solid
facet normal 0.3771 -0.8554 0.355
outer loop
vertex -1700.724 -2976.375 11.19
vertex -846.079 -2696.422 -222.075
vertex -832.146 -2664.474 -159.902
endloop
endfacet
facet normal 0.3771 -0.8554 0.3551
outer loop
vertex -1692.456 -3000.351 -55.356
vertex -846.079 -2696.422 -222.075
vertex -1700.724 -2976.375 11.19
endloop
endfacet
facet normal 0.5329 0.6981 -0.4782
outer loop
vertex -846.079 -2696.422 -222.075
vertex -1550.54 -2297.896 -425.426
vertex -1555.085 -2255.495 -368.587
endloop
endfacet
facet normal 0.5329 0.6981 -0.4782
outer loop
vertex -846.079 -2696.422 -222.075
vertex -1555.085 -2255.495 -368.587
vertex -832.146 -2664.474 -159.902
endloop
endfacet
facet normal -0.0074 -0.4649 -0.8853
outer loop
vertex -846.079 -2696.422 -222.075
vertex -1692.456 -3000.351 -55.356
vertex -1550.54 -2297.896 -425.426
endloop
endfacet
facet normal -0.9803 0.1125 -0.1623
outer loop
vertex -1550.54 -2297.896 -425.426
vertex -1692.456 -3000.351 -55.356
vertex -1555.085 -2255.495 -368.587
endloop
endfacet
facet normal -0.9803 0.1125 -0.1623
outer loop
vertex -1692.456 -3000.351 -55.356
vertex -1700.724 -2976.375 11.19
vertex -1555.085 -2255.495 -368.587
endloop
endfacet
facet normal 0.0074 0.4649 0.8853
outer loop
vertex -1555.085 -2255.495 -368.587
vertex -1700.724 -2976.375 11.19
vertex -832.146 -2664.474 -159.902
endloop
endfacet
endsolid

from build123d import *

# Parameters (mm, degrees)
BOSS_EXTRUDE1_DEPTH = 70
CHAMFER1_SIZE2      = 5.656659752
CHAMFER1_SIZE       = 70
CHAMFER2_SIZE2      = 70
CHAMFER2_SIZE       = 6.943744914
CHAMFER3_SIZE2      = 6.666257335
CHAMFER3_SIZE       = 70


with BuildPart() as part:
    # Sketch1 → Boss-Extrude1 (new body)
    with BuildSketch(Plane(origin=(-9.889310543, -592.27380366, -1254.98072345), x_dir=(0.9998495453727724, -0.017332267315879432, 0.0006921904012523395), z_dir=(-0.007446202576901621, -0.46490731349894177, -0.8853280431130489))):
        Polygon((-1515.522491278, 1908.617278557), (-785.459493052, 2356.346592467), (-1648.382414563, 2725.598184499), align=None)
    extrude(amount=BOSS_EXTRUDE1_DEPTH)

    # Chamfer1
    chamfer1_edges = [part.edges().sort_by_distance(p)[0] for p in [
        (-1266.956669693, -2852.967870133, -136.329178409),
    ]]
    chamfer1_side = [part.faces().sort_by_distance(p)[0] for p in [
        (-1266.95582728, -2852.915273683, -136.229018419),
    ]]
    chamfer(chamfer1_edges, length=CHAMFER1_SIZE - 0.0001, length2=CHAMFER1_SIZE2 - 0.0001, reference=chamfer1_side[0])  # a hair under: the kernel refuses the full size

    # Chamfer2
    chamfer2_edges = [part.edges().sort_by_distance(p)[0] for p in [
        (-1627.836641831, -2645.560867546, -242.208403318),
    ]]
    chamfer2_side = [part.faces().sort_by_distance(p)[0] for p in [
        (-1627.699937507, -2645.582975488, -242.197943675),
    ]]
    chamfer(chamfer2_edges, length=CHAMFER2_SIZE - 0.0001, length2=CHAMFER2_SIZE2 - 0.0001, reference=chamfer2_side[0])  # a hair under: the kernel refuses the full size

    # Chamfer3
    chamfer3_edges = [part.edges().sort_by_distance(p)[0] for p in [
        (-1193.89566166, -2492.66428344, -326.14785738),
    ]]
    chamfer3_side = [part.faces().sort_by_distance(p)[0] for p in [
        (-1193.894668894, -2492.602299605, -326.029820889),
    ]]
    chamfer(chamfer3_edges, length=CHAMFER3_SIZE - 0.0001, length2=CHAMFER3_SIZE2 - 0.0001, reference=chamfer3_side[0])  # a hair under: the kernel refuses the full size


solid = part.part
